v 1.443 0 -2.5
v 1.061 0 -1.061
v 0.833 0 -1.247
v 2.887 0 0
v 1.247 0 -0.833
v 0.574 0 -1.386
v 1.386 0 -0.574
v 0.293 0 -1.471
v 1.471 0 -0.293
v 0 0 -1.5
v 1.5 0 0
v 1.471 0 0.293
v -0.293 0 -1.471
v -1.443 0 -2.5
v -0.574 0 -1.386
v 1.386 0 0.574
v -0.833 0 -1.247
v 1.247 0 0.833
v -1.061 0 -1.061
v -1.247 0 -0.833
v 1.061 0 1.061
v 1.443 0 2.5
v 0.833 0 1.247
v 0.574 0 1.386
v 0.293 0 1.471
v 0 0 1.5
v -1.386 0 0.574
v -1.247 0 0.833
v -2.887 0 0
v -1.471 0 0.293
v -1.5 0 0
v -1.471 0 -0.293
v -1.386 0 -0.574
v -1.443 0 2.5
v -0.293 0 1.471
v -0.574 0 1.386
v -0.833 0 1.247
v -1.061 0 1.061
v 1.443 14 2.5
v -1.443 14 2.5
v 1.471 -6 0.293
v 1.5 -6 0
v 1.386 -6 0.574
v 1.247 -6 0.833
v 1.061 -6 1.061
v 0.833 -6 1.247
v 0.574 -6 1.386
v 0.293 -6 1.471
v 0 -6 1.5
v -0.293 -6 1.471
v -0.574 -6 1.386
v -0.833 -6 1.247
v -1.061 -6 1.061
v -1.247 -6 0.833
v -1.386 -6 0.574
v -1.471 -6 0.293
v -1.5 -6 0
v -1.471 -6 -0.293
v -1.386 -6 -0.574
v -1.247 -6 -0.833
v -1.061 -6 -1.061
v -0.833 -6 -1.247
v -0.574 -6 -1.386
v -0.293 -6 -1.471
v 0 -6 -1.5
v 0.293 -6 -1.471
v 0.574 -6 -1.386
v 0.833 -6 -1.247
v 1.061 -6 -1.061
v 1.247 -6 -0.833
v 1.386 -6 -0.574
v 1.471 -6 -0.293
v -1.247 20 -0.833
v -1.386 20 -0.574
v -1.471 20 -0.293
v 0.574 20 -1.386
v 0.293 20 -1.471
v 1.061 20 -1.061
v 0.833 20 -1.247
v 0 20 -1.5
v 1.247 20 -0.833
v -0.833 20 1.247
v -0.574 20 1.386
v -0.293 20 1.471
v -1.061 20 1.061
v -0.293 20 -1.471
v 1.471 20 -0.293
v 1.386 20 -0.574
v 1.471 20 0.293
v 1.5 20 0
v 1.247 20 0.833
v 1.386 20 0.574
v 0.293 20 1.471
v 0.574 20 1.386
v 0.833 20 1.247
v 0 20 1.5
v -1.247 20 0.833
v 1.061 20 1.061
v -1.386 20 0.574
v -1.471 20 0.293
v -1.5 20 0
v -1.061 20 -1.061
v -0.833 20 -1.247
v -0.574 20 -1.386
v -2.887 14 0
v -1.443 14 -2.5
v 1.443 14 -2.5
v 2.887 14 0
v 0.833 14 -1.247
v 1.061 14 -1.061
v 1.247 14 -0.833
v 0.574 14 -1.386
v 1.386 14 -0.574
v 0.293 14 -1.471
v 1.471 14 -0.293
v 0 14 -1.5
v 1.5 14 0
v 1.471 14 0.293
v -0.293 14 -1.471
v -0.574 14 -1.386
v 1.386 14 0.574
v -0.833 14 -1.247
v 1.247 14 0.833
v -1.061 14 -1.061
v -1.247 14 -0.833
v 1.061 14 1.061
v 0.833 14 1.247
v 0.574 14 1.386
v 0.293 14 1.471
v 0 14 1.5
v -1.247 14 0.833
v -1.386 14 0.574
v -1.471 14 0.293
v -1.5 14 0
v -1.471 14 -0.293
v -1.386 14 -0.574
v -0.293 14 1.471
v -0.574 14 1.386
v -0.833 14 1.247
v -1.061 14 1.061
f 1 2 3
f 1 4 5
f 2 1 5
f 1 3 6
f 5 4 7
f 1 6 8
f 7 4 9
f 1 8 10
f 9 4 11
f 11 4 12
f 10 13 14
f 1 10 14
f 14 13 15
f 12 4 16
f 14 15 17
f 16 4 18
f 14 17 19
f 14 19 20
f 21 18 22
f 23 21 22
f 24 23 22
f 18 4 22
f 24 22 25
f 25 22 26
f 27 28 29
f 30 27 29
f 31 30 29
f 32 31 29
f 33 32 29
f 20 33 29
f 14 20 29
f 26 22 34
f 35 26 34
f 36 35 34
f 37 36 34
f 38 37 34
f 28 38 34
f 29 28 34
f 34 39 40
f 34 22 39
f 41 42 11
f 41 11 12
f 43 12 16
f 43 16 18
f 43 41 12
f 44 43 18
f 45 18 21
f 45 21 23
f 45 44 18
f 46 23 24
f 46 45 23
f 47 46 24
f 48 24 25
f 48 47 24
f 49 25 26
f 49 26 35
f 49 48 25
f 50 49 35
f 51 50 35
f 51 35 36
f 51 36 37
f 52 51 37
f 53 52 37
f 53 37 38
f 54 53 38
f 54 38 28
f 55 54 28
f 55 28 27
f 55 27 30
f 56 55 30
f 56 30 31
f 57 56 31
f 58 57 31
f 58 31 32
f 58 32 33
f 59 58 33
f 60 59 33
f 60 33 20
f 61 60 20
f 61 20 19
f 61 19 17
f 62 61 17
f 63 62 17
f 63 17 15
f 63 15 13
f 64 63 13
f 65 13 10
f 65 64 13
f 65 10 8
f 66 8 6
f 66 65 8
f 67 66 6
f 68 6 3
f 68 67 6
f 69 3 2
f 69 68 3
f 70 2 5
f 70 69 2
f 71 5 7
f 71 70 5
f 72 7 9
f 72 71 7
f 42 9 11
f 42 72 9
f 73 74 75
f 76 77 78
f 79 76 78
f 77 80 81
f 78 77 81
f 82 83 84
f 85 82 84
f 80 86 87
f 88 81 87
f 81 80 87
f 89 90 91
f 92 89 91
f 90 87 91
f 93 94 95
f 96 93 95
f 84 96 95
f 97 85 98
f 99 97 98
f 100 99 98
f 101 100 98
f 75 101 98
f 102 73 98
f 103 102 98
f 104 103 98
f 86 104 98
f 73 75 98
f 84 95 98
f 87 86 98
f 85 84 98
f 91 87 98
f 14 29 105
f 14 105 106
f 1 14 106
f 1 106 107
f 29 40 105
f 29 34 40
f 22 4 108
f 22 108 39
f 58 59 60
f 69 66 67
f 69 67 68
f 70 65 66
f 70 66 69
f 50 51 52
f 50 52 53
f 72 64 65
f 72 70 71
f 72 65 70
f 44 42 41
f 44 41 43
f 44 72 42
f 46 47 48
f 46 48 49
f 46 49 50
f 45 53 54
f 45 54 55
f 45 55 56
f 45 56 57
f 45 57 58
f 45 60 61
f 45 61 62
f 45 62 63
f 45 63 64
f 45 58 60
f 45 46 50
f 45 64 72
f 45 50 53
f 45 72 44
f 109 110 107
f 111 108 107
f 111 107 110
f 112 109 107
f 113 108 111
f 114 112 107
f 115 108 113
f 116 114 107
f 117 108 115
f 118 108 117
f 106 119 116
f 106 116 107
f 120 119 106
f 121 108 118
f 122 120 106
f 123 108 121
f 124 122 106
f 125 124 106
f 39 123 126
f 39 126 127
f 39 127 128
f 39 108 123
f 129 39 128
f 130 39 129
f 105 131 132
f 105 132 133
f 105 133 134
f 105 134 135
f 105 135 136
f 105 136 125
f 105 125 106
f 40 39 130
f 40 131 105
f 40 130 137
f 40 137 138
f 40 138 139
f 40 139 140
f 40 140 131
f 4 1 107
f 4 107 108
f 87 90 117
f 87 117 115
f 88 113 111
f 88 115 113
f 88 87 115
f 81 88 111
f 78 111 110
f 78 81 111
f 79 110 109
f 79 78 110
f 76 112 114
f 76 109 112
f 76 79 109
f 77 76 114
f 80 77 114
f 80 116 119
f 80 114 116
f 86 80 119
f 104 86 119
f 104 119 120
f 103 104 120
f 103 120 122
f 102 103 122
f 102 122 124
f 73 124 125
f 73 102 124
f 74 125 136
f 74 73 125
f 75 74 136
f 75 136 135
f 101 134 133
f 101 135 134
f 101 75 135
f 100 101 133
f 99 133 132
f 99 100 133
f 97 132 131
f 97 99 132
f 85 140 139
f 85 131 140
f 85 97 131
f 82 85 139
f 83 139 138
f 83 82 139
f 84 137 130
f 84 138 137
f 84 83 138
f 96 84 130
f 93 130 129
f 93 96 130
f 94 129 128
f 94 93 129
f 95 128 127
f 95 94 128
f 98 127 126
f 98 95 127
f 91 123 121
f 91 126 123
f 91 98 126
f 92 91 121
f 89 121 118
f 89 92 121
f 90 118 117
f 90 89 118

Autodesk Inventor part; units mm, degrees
ref_plane "YZ Plane" through (0, 0, 0) normal (1, 0, 0) x (0, 1, 0)
ref_plane "XZ Plane" through (0, 0, 0) normal (0, 1, 0) x (-1, 0, 0)
ref_plane "XY Plane" through (0, 0, 0) normal (0, 0, 1) x (1, 0, 0)
sketch "草圖2" plane through (0, 0, 0) normal (0, 1, 0) x (-1, 0, 0)
  line L0 (-2.8868, 0) -> (-1.4434, 2.5)
  line L1 (-1.4434, 2.5) -> (1.4434, 2.5)
  line L2 (1.4434, 2.5) -> (2.8868, 0)
  line L3 (2.8868, 0) -> (1.4434, -2.5)
  line L4 (1.4434, -2.5) -> (-1.4434, -2.5)
  line L5 (-1.4434, -2.5) -> (-2.8868, 0)
  point P0 (0, 0)
  point P1 (0, 0)
  dimension "d2" = 5
extrude "擠出1" add sketch "草圖2" along normal blind 14
sketch "草圖3" plane through (0, 0, 0) normal (0, 0, 1) x (1, 0, 0)
  line L0 (1.4434, 14) -> (-1.4434, 14) projected
  line L1 (0, 14) -> (1.5, 14)
  line L2 (1.5, 14) -> (1.5, 20)
  line L3 (1.5, 20) -> (0, 20)
  line L4 (0, 20) -> (0, 14)
  line L5 (0, 17.268) -> (0, -3.3114)
  line L6 (0, 0) -> (1.5, 0)
  line L7 (1.5, 0) -> (1.5, -6)
  line L8 (1.5, -6) -> (0, -6)
  line L9 (0, -6) -> (0, 0)
  point P0 (0.75, 20)
  dimension "d5" = 3
  dimension "d6" = 6
  dimension "d8" = 6
revolve "迴轉1" add sketch "草圖3" angle 360 about axis through (0, 17.268, 0) along (0, -1, 0)
properties part number "copper_pillar_M3_L15" material "Copper"
